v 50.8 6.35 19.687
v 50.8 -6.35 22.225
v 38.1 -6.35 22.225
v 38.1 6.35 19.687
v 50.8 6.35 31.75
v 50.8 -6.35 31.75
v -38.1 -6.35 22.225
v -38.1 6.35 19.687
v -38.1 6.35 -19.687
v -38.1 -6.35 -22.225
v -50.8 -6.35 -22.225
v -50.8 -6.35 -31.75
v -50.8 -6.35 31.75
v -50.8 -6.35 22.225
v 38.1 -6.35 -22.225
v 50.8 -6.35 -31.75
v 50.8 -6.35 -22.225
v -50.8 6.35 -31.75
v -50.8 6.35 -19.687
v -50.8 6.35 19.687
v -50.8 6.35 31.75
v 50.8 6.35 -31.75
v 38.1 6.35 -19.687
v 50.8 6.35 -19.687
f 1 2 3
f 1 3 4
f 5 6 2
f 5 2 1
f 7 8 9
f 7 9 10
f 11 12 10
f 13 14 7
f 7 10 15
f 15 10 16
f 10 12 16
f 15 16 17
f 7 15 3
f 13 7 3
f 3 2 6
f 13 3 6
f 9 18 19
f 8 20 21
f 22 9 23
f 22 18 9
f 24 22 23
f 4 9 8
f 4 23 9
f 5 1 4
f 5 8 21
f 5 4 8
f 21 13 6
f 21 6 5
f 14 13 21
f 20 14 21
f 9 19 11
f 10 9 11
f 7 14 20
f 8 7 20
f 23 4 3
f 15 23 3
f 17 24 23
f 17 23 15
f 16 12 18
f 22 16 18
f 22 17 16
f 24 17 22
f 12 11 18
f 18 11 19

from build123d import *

# Parameters (mm, degrees)
F0_W     = 12.7
F0_H     = 63.5
F1_DEPTH = 50.8
F3_DEPTH = 12.7


# Not quite as in the source:
# - a pattern or mirror of a feature is missing from the dataset's text; its kind, count and spacing are read off the source's solid


with BuildPart() as f1:
    # F0 (on Right) → F1 (new body, symmetric)
    with BuildSketch(Plane.YZ):
        Rectangle(F0_W, F0_H)
    extrude(amount=F1_DEPTH, both=True)

    # F2 (on face) → F3 (cut)
    with BuildSketch(Plane(origin=(-50.8, 0, 0), x_dir=(0, -1, 0), z_dir=(-1, 0, 0))):
        Polygon((6.35, -22.225), (6.35, 22.225), (-6.35, 19.6872895852), (-6.35, -19.6872895852), align=None)
    f3 = extrude(amount=-F3_DEPTH, mode=Mode.SUBTRACT)

    # F3_copies: F3 across plane
    add(f3.mirror(Plane(origin=(0, 0, 0), x_dir=(0, 0, 1), z_dir=(1, 0, 0))), mode=Mode.SUBTRACT)


solid = f1.part
